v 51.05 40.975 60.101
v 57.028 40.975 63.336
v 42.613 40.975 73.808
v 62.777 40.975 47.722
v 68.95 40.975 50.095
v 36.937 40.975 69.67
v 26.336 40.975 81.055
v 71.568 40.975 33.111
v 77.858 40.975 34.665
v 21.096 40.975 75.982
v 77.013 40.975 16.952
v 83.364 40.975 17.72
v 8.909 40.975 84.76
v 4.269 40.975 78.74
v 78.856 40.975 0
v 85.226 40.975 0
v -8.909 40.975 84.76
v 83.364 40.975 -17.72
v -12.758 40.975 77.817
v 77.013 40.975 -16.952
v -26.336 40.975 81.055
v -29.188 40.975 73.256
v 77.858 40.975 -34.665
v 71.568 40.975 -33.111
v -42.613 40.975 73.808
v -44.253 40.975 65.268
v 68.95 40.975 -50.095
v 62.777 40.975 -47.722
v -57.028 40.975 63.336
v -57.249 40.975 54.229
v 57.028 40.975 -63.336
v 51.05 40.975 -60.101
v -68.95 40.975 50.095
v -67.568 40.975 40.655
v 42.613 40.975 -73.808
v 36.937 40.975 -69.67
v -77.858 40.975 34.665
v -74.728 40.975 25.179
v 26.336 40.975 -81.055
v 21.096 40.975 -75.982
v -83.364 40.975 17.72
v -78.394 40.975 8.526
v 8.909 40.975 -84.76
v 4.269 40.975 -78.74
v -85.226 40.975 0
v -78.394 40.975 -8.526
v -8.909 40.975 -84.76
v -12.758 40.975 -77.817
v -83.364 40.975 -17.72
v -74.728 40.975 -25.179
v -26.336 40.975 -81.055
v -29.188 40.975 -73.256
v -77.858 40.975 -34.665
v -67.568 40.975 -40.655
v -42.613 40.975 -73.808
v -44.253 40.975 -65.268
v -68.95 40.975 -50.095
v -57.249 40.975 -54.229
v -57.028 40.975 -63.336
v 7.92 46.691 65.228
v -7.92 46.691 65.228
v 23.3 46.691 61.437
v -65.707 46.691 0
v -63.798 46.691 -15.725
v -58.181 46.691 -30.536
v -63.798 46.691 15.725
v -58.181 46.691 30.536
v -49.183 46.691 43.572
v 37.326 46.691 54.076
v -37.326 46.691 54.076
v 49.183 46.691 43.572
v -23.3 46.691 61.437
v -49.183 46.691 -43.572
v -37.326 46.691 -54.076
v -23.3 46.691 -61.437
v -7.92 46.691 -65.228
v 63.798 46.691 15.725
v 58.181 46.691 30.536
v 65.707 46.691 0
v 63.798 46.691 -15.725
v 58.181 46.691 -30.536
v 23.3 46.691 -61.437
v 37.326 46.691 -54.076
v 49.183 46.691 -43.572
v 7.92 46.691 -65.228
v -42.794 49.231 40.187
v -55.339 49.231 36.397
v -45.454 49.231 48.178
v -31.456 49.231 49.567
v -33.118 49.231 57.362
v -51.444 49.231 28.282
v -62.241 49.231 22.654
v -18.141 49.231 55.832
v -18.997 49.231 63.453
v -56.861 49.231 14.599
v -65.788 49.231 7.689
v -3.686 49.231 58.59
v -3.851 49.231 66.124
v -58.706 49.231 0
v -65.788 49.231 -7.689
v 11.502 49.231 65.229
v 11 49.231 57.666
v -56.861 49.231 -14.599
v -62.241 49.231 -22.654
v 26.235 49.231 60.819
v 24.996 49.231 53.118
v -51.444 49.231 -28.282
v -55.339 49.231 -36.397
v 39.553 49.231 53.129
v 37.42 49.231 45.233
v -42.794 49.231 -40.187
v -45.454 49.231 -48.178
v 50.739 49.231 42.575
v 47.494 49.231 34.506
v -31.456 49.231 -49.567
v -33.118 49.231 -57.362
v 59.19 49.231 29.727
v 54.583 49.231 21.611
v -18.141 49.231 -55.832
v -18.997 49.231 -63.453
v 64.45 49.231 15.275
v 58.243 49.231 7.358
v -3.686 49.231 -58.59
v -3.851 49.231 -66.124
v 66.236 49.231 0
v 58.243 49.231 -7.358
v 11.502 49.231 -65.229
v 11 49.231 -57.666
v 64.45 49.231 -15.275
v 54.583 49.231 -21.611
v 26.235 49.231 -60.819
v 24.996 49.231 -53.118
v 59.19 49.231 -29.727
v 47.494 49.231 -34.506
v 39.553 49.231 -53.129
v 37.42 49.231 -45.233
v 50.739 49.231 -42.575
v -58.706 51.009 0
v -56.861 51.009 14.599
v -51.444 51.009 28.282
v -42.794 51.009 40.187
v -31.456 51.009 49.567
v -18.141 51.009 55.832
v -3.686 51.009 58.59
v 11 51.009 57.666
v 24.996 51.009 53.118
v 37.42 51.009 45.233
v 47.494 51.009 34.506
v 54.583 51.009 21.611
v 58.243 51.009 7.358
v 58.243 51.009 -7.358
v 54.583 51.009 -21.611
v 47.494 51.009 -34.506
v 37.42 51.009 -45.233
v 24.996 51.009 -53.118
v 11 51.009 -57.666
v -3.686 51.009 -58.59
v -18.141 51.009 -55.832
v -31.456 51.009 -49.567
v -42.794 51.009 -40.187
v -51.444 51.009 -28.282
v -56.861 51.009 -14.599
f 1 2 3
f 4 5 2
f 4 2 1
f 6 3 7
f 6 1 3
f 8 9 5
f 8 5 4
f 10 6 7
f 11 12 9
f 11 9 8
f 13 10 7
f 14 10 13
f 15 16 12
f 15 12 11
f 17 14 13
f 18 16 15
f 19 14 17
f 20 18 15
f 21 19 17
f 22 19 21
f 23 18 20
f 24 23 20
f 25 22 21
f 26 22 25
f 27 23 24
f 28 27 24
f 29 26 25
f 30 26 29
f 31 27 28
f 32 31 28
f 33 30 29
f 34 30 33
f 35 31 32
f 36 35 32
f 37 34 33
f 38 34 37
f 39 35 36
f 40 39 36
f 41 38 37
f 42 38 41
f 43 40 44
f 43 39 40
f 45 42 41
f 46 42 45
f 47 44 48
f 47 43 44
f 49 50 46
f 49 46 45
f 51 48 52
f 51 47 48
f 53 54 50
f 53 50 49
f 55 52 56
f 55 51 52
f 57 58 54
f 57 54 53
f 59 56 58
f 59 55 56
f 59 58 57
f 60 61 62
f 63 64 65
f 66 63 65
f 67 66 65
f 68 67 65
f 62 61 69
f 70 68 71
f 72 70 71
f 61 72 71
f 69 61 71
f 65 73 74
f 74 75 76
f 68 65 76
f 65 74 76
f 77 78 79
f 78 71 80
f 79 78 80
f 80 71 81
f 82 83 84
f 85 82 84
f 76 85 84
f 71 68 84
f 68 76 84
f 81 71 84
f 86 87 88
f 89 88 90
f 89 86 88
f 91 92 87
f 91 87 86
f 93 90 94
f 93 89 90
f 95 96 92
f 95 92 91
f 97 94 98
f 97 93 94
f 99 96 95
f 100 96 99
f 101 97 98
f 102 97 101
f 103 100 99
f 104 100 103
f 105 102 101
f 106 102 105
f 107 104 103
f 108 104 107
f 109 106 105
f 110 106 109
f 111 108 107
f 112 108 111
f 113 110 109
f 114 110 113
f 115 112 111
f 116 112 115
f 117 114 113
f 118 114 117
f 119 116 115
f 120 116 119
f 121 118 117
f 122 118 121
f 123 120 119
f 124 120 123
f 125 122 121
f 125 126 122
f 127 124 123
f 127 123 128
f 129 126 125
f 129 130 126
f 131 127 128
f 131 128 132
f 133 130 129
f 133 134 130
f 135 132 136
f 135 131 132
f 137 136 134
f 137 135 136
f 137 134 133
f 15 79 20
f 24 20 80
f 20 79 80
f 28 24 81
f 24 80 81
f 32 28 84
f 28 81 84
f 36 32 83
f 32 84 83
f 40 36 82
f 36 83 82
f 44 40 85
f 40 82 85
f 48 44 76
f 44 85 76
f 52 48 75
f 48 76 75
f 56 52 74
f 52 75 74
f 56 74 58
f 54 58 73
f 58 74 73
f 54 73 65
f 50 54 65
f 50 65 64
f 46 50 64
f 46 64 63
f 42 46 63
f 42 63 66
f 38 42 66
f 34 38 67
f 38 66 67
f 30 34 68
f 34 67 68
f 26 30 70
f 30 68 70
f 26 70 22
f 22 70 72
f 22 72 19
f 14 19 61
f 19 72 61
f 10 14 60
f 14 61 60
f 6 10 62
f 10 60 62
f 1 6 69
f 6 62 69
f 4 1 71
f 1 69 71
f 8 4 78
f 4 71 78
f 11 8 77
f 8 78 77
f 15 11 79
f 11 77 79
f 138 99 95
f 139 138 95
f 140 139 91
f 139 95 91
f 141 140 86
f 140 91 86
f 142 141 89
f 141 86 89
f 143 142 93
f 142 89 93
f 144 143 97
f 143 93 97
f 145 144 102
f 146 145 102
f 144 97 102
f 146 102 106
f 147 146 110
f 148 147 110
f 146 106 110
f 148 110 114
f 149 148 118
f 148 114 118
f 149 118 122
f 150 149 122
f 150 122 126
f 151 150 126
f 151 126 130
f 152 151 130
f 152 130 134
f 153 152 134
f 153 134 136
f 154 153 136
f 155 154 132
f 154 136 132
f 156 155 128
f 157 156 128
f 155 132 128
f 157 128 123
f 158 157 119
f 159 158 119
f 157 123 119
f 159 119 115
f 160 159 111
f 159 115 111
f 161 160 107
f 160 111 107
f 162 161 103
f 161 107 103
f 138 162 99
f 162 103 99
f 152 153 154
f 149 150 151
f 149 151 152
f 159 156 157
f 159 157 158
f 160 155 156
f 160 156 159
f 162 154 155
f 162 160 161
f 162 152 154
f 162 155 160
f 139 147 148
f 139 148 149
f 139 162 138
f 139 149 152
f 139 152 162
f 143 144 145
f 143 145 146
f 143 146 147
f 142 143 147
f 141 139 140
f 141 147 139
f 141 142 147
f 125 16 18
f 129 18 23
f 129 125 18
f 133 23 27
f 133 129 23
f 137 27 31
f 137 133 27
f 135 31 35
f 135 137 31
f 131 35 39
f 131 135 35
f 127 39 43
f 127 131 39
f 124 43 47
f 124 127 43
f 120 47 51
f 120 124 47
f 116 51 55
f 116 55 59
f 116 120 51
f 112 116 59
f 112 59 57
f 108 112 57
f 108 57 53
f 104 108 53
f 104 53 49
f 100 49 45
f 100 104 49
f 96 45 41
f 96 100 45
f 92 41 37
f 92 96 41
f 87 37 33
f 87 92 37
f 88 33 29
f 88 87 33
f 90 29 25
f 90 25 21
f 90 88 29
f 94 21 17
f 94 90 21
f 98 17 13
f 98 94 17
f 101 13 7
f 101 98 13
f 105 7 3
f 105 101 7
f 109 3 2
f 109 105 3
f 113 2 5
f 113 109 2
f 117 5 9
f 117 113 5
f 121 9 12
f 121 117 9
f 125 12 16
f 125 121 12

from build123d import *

# Parameters (mm, degrees)
F2_T     = -2.54
F3_R     = 58.705538
F4_DEPTH = 1.778


with BuildPart() as f1:
    # F0 (on Top) → F1 (revolve)
    with BuildSketch(Plane.XY):
        Polygon((66.235654, 49.231492), (0, 49.231492), (0, 40.974639), (85.226417, 40.974639), align=None)
    revolve(axis=Axis((0, 45.103066, 0), (0, 1, 0)))

    # F2
    f2_openings = [f1.faces().sort_by_distance(p)[0] for p in [
        (0, 40.974639, 0),
    ]]
    offset(amount=F2_T, openings=f2_openings)

    # F3 (on face) → F4 (join)
    with BuildSketch(Plane(origin=(0, 49.231492, 0), x_dir=(-1, 0, 0), z_dir=(0, 1, 0))):
        Circle(F3_R)
    extrude(amount=F4_DEPTH)


solid = f1.part
